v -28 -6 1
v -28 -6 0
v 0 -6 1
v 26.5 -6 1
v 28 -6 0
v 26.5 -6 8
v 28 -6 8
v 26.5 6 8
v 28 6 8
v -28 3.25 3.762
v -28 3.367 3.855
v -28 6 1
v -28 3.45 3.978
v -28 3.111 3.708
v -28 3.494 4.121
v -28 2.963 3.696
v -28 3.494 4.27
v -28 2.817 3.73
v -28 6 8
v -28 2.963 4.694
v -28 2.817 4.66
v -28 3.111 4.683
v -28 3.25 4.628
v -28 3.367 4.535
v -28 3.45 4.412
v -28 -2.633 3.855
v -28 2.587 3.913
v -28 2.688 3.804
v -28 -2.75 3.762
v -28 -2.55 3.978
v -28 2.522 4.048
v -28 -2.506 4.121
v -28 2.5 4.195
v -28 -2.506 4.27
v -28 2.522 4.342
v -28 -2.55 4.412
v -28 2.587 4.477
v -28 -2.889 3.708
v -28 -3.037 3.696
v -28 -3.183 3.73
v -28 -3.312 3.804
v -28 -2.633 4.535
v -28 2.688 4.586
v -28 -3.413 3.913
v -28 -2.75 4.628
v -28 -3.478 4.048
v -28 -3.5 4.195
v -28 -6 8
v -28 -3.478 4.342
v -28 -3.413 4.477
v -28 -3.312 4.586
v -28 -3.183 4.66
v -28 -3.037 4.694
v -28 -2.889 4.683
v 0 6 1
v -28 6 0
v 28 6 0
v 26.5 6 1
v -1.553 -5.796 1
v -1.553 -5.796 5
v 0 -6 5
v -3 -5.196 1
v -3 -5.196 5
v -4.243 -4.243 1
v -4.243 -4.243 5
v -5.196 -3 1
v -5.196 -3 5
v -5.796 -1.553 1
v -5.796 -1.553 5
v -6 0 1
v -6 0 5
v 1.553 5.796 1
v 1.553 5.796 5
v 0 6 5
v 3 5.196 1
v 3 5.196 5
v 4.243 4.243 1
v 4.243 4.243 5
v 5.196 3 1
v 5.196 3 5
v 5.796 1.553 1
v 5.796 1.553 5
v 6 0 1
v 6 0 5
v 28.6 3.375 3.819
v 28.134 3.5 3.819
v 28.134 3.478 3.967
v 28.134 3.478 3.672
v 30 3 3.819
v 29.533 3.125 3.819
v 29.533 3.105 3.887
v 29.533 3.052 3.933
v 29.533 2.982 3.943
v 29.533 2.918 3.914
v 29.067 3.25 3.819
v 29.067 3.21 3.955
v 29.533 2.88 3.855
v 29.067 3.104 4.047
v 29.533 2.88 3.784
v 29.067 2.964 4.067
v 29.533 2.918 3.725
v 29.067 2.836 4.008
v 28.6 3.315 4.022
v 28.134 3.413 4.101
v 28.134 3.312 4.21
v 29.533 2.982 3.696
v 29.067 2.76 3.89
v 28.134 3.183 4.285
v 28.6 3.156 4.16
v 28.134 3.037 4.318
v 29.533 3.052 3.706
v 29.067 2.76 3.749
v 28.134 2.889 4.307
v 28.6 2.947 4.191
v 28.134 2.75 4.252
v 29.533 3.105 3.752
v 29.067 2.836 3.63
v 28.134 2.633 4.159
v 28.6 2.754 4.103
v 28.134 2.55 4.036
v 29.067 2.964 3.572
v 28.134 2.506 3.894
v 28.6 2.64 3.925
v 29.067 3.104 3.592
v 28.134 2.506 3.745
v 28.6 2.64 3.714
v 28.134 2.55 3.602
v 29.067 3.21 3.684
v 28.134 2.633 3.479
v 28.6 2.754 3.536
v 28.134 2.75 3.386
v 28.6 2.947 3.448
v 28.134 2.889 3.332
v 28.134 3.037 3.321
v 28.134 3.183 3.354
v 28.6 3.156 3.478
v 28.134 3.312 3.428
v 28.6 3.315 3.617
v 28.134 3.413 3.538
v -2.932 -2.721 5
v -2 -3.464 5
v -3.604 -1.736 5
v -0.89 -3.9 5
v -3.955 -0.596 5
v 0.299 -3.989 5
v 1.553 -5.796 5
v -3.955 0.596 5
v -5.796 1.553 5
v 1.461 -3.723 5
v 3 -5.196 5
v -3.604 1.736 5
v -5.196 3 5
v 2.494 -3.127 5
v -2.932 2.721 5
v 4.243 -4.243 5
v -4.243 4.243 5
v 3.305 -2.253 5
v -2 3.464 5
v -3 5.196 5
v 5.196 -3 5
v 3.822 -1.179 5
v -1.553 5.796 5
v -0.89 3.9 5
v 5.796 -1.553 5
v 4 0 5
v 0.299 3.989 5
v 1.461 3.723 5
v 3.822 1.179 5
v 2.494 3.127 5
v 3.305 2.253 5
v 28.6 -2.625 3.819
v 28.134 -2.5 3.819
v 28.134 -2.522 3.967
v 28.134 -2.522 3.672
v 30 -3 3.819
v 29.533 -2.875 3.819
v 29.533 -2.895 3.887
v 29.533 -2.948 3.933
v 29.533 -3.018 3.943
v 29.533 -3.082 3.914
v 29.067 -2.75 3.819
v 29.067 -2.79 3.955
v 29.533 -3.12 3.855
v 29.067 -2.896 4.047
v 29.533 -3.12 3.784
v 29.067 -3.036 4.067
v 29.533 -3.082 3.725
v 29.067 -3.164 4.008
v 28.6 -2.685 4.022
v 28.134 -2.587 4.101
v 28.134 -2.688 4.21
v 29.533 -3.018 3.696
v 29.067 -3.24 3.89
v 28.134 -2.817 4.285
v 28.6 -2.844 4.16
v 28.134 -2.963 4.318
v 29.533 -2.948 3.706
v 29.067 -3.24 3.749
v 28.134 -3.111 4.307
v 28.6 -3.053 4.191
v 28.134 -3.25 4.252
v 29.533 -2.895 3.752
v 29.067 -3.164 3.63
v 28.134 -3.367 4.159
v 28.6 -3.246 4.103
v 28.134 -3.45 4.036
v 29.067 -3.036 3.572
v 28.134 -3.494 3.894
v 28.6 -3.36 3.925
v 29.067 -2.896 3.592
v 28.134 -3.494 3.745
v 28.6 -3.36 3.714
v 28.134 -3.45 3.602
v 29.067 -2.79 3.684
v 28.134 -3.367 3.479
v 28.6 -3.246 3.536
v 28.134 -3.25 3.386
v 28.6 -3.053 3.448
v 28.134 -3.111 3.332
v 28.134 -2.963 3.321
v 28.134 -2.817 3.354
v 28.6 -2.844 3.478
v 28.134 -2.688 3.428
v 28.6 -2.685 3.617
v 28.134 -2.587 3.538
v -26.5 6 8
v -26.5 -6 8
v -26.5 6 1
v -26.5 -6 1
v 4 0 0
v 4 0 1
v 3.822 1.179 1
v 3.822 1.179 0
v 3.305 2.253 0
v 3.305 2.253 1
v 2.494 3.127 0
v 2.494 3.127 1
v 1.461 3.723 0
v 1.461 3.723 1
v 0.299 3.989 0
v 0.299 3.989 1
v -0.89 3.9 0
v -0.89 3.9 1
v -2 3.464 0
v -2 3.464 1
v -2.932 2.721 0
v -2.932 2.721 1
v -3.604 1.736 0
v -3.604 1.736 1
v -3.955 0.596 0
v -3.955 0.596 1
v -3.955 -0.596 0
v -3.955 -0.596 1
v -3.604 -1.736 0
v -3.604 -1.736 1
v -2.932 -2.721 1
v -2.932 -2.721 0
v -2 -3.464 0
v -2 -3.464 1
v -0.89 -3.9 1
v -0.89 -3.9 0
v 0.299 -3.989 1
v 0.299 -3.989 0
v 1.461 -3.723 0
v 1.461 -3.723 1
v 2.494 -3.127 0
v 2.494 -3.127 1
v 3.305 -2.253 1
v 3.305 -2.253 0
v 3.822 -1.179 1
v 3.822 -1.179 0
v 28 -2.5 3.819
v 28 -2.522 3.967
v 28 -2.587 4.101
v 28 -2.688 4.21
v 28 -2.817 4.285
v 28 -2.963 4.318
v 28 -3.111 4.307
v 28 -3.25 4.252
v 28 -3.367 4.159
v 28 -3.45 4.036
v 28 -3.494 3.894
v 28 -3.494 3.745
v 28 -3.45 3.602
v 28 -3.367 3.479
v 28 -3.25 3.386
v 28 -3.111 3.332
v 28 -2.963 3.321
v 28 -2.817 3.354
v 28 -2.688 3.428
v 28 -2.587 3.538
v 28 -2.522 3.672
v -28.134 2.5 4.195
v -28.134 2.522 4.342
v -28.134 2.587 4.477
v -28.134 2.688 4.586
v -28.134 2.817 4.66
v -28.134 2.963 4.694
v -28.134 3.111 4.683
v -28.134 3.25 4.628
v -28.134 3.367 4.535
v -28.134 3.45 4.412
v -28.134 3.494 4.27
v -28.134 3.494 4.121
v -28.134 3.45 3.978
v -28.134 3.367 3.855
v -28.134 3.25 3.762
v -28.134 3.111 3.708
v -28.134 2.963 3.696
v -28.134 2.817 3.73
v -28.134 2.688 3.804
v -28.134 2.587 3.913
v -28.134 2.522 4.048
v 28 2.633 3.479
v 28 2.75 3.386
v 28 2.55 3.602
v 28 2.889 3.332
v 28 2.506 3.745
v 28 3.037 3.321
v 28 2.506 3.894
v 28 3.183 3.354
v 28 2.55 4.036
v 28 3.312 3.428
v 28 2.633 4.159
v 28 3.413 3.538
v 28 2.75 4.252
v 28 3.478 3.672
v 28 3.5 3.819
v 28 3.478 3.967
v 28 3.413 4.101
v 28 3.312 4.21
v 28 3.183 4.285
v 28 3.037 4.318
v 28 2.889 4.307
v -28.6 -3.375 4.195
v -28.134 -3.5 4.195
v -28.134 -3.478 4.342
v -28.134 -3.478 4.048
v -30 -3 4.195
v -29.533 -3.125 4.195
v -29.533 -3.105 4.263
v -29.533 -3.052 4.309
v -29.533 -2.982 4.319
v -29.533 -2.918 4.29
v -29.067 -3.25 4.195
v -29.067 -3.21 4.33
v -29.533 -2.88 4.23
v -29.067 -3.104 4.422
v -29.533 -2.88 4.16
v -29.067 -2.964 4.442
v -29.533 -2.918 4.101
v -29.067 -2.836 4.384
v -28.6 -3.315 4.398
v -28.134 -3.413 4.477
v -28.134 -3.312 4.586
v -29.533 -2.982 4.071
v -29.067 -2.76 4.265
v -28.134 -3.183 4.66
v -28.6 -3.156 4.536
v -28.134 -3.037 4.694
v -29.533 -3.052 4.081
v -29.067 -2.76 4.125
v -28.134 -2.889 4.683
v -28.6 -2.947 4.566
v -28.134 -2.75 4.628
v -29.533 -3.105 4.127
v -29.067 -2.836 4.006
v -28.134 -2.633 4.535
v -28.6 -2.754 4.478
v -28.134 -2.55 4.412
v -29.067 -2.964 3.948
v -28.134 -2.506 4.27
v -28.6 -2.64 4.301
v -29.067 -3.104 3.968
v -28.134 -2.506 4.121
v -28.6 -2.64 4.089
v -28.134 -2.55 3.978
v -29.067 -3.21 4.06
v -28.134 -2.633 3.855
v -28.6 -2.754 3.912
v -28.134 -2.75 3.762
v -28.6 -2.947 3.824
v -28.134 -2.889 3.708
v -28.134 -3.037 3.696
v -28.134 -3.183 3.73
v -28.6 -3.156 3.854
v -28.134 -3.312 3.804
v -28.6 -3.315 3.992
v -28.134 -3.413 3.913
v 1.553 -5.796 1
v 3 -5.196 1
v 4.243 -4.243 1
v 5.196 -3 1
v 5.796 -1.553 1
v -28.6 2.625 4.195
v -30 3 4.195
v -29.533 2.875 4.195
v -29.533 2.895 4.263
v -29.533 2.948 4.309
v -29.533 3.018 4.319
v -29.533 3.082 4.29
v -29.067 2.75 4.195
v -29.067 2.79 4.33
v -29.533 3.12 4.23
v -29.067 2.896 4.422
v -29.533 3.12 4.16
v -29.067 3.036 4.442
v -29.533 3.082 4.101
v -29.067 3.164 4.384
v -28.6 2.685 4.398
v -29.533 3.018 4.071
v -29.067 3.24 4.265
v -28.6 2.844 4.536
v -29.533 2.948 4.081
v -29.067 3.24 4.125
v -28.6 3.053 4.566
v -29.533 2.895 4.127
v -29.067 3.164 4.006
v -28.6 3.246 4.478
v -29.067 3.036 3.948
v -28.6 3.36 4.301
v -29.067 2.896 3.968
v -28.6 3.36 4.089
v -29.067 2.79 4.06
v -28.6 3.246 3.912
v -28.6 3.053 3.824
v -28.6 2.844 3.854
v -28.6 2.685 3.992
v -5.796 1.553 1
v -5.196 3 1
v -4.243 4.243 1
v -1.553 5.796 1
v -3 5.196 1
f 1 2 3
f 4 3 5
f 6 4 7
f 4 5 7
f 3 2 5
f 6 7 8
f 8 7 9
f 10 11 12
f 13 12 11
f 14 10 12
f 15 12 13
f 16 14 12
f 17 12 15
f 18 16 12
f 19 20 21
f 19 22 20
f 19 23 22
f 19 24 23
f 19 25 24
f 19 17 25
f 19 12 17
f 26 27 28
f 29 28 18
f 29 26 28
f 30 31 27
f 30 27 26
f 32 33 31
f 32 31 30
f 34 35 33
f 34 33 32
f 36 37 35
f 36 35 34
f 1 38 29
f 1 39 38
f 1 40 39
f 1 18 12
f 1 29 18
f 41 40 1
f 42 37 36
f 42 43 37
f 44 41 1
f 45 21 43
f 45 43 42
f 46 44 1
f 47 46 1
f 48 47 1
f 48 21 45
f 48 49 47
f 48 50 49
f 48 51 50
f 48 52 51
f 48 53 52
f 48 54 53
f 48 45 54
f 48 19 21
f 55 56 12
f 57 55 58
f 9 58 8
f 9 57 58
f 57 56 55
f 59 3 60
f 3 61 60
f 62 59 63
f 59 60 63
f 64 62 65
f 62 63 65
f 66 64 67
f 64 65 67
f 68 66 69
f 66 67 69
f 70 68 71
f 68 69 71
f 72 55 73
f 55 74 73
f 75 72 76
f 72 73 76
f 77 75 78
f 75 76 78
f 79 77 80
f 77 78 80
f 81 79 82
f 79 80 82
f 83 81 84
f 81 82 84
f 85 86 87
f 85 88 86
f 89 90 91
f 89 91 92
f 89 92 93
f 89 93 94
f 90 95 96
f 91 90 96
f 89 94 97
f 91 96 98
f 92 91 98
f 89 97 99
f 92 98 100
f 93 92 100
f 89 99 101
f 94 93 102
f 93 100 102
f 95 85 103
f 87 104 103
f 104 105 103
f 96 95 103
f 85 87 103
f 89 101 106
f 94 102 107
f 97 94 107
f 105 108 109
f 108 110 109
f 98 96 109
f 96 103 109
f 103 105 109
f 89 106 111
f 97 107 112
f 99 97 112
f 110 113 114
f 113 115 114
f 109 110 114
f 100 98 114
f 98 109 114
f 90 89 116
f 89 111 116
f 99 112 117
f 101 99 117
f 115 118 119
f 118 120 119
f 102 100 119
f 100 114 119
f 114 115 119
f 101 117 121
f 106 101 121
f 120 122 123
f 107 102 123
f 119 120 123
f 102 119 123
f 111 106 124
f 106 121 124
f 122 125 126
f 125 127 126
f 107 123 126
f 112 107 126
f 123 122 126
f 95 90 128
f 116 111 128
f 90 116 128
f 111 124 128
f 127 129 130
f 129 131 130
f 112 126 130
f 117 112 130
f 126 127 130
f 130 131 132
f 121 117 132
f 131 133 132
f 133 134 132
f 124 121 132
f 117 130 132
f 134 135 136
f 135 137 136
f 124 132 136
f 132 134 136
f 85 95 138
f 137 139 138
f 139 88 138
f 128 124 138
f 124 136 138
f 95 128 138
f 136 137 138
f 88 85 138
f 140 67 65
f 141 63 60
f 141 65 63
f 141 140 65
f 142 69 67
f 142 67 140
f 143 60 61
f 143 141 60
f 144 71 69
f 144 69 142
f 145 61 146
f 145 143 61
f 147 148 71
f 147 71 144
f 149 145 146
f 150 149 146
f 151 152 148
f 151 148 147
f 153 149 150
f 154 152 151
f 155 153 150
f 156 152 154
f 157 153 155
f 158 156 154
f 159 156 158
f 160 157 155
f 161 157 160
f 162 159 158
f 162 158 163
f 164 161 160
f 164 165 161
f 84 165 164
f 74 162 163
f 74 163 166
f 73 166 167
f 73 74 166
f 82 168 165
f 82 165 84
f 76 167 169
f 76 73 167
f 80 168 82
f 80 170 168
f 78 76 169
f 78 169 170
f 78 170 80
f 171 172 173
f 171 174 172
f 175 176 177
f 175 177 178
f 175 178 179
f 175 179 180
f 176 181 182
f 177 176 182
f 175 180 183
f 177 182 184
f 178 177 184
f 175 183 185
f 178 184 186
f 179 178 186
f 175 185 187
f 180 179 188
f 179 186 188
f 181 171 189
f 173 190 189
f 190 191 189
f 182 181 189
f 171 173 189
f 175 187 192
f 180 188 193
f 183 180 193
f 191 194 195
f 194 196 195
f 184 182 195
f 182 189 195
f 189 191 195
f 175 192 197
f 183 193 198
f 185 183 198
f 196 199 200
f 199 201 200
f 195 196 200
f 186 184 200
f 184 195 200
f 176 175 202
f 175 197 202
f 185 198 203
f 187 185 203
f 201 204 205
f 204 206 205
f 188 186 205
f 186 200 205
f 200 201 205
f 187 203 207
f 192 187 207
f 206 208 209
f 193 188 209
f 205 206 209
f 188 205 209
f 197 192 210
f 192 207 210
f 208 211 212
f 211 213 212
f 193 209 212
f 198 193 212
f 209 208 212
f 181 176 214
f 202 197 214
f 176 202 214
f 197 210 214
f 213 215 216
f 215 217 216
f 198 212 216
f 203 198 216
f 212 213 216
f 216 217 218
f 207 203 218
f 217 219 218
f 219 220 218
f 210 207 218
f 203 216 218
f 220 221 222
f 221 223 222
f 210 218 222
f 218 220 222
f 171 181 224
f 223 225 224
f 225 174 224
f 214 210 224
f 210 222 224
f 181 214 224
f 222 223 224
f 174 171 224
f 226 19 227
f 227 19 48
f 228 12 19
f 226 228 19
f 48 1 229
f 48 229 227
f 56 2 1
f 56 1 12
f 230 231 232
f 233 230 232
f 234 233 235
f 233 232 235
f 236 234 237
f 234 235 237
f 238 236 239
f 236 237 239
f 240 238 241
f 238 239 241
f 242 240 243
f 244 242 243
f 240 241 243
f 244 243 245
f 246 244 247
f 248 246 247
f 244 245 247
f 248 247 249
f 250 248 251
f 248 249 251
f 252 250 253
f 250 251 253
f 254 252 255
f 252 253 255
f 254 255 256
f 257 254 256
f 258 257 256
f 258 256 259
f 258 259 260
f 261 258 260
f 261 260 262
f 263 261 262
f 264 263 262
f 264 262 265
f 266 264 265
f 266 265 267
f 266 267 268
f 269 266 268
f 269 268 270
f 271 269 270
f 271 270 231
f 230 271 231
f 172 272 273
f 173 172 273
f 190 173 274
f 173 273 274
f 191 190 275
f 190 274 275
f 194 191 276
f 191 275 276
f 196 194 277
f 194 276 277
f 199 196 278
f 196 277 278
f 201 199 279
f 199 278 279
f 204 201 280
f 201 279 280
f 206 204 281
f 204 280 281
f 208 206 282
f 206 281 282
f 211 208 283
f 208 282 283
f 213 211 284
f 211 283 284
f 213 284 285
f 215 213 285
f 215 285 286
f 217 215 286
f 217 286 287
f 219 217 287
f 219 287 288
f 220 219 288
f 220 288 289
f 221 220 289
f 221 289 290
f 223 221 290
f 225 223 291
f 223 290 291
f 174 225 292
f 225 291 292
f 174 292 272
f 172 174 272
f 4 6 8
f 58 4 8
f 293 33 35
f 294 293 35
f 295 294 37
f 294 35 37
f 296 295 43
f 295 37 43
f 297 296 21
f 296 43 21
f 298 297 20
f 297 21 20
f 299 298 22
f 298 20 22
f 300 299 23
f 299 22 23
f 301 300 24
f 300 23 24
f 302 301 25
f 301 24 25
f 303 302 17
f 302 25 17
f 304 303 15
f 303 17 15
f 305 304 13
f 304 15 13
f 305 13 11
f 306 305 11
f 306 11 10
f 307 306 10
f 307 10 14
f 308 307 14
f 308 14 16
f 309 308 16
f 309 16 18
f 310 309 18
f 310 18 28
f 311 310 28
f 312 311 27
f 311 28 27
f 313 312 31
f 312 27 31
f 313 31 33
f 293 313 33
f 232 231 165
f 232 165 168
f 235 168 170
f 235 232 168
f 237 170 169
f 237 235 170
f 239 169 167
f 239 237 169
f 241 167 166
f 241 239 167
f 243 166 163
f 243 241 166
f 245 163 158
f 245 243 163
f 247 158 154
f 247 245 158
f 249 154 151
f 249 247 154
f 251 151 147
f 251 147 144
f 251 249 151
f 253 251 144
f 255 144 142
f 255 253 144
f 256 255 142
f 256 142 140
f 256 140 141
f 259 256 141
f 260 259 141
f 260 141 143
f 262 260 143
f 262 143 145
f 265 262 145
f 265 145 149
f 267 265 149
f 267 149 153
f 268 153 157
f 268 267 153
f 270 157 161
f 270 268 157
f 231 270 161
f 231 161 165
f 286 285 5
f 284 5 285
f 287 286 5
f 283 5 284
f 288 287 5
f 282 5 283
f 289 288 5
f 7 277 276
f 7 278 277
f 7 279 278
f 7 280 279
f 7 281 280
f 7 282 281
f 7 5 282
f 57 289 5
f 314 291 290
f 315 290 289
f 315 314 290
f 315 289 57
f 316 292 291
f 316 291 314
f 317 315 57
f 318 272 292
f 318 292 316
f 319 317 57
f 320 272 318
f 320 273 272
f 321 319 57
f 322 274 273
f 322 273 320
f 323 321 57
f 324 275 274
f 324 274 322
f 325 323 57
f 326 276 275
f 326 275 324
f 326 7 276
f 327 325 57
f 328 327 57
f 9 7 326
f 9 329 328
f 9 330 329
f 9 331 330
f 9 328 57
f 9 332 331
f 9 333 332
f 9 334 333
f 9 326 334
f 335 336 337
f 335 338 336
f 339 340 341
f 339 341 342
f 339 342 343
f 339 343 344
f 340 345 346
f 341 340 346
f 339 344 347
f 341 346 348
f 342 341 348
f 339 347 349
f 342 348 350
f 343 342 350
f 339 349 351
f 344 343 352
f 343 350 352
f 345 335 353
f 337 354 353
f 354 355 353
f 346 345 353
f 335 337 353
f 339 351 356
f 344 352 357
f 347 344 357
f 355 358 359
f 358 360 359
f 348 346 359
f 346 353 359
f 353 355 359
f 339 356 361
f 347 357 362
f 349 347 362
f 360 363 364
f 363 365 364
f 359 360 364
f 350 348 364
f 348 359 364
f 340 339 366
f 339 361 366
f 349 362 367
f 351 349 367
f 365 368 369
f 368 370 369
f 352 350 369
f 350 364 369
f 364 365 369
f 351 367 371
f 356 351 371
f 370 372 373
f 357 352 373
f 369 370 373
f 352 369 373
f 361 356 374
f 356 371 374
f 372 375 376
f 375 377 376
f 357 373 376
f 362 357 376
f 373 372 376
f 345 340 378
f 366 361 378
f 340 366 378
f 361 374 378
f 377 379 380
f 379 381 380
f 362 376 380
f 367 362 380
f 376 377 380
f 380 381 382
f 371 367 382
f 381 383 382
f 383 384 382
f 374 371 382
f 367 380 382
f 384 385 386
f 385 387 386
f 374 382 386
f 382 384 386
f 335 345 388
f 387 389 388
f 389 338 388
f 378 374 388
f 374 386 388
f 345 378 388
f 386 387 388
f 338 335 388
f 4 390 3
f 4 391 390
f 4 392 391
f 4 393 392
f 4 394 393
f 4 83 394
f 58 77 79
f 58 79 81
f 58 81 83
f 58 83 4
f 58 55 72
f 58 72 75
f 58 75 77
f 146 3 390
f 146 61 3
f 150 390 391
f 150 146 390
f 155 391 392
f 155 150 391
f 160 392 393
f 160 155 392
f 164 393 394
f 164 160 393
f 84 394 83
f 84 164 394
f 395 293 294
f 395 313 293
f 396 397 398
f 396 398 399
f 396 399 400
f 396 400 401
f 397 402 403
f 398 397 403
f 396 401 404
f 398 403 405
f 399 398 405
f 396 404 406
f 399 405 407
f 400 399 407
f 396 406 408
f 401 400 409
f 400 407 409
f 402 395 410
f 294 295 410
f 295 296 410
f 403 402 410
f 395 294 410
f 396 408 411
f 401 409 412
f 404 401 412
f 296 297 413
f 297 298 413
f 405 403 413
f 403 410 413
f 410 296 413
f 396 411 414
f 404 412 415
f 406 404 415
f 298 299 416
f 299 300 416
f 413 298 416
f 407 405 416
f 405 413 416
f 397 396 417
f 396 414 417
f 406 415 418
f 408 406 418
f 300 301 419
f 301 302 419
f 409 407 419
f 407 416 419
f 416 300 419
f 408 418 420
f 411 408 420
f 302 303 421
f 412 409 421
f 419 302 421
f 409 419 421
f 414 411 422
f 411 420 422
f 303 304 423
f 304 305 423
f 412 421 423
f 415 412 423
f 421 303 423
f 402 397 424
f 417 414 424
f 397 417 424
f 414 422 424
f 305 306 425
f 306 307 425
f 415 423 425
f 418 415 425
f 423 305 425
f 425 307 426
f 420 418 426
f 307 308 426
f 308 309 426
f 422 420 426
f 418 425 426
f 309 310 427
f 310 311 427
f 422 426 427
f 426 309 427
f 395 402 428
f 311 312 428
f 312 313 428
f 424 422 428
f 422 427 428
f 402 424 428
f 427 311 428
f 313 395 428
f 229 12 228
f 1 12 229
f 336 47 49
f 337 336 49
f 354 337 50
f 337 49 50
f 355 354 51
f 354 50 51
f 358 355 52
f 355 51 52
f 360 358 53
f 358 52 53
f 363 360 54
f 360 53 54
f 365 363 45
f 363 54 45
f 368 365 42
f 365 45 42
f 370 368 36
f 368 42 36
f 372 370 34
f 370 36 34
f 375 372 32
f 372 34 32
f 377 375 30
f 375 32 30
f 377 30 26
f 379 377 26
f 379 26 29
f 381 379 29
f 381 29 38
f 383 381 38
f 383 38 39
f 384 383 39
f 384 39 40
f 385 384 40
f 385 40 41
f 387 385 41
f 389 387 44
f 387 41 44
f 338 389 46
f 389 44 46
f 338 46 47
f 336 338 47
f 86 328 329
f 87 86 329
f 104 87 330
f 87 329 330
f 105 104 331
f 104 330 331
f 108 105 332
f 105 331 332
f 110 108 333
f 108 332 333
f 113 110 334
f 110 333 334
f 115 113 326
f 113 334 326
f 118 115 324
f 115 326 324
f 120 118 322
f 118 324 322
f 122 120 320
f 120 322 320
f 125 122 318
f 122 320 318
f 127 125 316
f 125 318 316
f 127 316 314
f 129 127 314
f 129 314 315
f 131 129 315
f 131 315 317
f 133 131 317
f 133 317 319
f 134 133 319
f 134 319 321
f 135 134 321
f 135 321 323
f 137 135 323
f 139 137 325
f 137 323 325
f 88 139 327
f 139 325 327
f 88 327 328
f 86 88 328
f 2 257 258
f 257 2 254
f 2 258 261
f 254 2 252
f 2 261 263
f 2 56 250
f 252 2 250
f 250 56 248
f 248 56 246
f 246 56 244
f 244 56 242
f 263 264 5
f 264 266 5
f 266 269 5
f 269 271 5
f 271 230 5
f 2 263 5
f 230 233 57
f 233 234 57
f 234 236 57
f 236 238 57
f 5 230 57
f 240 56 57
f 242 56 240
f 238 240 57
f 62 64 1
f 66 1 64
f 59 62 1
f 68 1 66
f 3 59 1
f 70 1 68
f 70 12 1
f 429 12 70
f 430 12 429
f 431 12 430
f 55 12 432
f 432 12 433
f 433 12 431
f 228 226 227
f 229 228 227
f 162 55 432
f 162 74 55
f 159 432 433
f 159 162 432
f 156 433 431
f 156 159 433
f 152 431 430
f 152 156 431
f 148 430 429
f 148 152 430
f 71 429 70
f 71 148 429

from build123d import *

# Parameters (mm, degrees)
F0_W        = 56
F0_H        = 12
F1_DEPTH    = 1
F2_W        = 12
F2_H        = 12
F2_R        = 4
F3_DEPTH    = 4
F4_DEPTH    = 25
F5_R        = 5.99999
F6_W        = 12
F6_H        = 7
F7_DEPTH    = 1.5
F8_W        = 12
F8_H        = 7
F9_DEPTH    = 1.5
F10_R       = 0.5
F11_DEPTH   = 2
F12_R       = 0.5
F13_DEPTH   = 2
F14_SIZE2   = 1.8660254038
F14_SIZE    = 0.5
F14_2_SIZE2 = 1.8660254038
F14_2_SIZE  = 0.5
F14_3_SIZE2 = 1.8660254038
F14_3_SIZE  = 0.5
F14_4_SIZE2 = 1.8660254038
F14_4_SIZE  = 0.5


# Not quite as in the source:
# - a fillet or chamfer is up to 0.001 mm smaller than in the source, because OpenCascade refuses the exact size


with BuildPart() as f1:
    # F0 (on Top) → F1 (new body)
    with BuildSketch(Plane.XY):
        Rectangle(F0_W, F0_H)
    extrude(amount=F1_DEPTH)

    # F2 (on face) → F3 (join)
    with BuildSketch(Plane.XY.offset(1)):
        Rectangle(F2_W, F2_H)
        Circle(F2_R, mode=Mode.SUBTRACT)
    extrude(amount=F3_DEPTH)

    # F4 (cut): a face of the model
    f4_faces = [f1.faces().sort_by_distance(p)[0] for p in [
        (0, 0, 1),
    ]]
    extrude(f4_faces, amount=-F4_DEPTH, mode=Mode.SUBTRACT)

    # F5 (radius 6 in the source; OpenCascade refuses exactly that, so slightly less here)
    f5_edges = [f1.edges().sort_by_distance(p)[0] for p in [
        (6, 6, 3),
        (6, -6, 3),
        (-6, -6, 3),
        (-6, 6, 3),
    ]]
    fillet(f5_edges, radius=F5_R)

    # F6 (on face) → F7 (join)
    with BuildSketch(Plane.YZ.offset(28)):
        with Locations((0, 4.5)):
            Rectangle(F6_W, F6_H)
    extrude(amount=-F7_DEPTH)

    # F10 (on face) → F11 (join)
    with BuildSketch(Plane.YZ.offset(28)):
        with Locations((3, 3.8193718065)):
            Circle(F10_R)
        with Locations((-3, 3.8193718065)):
            Circle(F10_R)
    extrude(amount=F11_DEPTH)

    # F14
    f14_edges = [f1.edges().sort_by_distance(p)[0] for p in [
        (30, 2.5, 3.819372),
    ]]
    f14_side = f1.faces().sort_by_distance((30, 3, 3.819372))[0]
    chamfer(f14_edges, length=F14_SIZE, length2=F14_SIZE2, reference=f14_side)

    # F14#2
    f14_2_edges = [f1.edges().sort_by_distance(p)[0] for p in [
        (30, -3.5, 3.819372),
    ]]
    f14_2_side = f1.faces().sort_by_distance((30, -3, 3.819372))[0]
    chamfer(f14_2_edges, length=F14_2_SIZE, length2=F14_2_SIZE2, reference=f14_2_side)


with BuildPart() as f9:
    # F8 (on face) → F9 (new body)
    with BuildSketch(Plane(origin=(-28, 0, 0), x_dir=(0, -1, 0), z_dir=(-1, 0, 0))):
        with Locations((0, 4.5)):
            Rectangle(F8_W, F8_H)
    extrude(amount=-F9_DEPTH)

    # F12 (on face) → F13 (join)
    with BuildSketch(Plane(origin=(-28, 0, 0), x_dir=(0, -1, 0), z_dir=(-1, 0, 0))):
        with Locations((3, 4.1950419545)):
            Circle(F12_R)
        with Locations((-3, 4.1950419545)):
            Circle(F12_R)
    extrude(amount=F13_DEPTH)

    # F14#3
    f14_3_edges = [f9.edges().sort_by_distance(p)[0] for p in [
        (-30, -2.5, 4.195042),
    ]]
    f14_3_side = f9.faces().sort_by_distance((-30, -3, 4.195042))[0]
    chamfer(f14_3_edges, length=F14_3_SIZE, length2=F14_3_SIZE2, reference=f14_3_side)

    # F14#4
    f14_4_edges = [f9.edges().sort_by_distance(p)[0] for p in [
        (-30, 3.5, 4.195042),
    ]]
    f14_4_side = f9.faces().sort_by_distance((-30, 3, 4.195042))[0]
    chamfer(f14_4_edges, length=F14_4_SIZE, length2=F14_4_SIZE2, reference=f14_4_side)


solid = Compound([f1.part, f9.part])
